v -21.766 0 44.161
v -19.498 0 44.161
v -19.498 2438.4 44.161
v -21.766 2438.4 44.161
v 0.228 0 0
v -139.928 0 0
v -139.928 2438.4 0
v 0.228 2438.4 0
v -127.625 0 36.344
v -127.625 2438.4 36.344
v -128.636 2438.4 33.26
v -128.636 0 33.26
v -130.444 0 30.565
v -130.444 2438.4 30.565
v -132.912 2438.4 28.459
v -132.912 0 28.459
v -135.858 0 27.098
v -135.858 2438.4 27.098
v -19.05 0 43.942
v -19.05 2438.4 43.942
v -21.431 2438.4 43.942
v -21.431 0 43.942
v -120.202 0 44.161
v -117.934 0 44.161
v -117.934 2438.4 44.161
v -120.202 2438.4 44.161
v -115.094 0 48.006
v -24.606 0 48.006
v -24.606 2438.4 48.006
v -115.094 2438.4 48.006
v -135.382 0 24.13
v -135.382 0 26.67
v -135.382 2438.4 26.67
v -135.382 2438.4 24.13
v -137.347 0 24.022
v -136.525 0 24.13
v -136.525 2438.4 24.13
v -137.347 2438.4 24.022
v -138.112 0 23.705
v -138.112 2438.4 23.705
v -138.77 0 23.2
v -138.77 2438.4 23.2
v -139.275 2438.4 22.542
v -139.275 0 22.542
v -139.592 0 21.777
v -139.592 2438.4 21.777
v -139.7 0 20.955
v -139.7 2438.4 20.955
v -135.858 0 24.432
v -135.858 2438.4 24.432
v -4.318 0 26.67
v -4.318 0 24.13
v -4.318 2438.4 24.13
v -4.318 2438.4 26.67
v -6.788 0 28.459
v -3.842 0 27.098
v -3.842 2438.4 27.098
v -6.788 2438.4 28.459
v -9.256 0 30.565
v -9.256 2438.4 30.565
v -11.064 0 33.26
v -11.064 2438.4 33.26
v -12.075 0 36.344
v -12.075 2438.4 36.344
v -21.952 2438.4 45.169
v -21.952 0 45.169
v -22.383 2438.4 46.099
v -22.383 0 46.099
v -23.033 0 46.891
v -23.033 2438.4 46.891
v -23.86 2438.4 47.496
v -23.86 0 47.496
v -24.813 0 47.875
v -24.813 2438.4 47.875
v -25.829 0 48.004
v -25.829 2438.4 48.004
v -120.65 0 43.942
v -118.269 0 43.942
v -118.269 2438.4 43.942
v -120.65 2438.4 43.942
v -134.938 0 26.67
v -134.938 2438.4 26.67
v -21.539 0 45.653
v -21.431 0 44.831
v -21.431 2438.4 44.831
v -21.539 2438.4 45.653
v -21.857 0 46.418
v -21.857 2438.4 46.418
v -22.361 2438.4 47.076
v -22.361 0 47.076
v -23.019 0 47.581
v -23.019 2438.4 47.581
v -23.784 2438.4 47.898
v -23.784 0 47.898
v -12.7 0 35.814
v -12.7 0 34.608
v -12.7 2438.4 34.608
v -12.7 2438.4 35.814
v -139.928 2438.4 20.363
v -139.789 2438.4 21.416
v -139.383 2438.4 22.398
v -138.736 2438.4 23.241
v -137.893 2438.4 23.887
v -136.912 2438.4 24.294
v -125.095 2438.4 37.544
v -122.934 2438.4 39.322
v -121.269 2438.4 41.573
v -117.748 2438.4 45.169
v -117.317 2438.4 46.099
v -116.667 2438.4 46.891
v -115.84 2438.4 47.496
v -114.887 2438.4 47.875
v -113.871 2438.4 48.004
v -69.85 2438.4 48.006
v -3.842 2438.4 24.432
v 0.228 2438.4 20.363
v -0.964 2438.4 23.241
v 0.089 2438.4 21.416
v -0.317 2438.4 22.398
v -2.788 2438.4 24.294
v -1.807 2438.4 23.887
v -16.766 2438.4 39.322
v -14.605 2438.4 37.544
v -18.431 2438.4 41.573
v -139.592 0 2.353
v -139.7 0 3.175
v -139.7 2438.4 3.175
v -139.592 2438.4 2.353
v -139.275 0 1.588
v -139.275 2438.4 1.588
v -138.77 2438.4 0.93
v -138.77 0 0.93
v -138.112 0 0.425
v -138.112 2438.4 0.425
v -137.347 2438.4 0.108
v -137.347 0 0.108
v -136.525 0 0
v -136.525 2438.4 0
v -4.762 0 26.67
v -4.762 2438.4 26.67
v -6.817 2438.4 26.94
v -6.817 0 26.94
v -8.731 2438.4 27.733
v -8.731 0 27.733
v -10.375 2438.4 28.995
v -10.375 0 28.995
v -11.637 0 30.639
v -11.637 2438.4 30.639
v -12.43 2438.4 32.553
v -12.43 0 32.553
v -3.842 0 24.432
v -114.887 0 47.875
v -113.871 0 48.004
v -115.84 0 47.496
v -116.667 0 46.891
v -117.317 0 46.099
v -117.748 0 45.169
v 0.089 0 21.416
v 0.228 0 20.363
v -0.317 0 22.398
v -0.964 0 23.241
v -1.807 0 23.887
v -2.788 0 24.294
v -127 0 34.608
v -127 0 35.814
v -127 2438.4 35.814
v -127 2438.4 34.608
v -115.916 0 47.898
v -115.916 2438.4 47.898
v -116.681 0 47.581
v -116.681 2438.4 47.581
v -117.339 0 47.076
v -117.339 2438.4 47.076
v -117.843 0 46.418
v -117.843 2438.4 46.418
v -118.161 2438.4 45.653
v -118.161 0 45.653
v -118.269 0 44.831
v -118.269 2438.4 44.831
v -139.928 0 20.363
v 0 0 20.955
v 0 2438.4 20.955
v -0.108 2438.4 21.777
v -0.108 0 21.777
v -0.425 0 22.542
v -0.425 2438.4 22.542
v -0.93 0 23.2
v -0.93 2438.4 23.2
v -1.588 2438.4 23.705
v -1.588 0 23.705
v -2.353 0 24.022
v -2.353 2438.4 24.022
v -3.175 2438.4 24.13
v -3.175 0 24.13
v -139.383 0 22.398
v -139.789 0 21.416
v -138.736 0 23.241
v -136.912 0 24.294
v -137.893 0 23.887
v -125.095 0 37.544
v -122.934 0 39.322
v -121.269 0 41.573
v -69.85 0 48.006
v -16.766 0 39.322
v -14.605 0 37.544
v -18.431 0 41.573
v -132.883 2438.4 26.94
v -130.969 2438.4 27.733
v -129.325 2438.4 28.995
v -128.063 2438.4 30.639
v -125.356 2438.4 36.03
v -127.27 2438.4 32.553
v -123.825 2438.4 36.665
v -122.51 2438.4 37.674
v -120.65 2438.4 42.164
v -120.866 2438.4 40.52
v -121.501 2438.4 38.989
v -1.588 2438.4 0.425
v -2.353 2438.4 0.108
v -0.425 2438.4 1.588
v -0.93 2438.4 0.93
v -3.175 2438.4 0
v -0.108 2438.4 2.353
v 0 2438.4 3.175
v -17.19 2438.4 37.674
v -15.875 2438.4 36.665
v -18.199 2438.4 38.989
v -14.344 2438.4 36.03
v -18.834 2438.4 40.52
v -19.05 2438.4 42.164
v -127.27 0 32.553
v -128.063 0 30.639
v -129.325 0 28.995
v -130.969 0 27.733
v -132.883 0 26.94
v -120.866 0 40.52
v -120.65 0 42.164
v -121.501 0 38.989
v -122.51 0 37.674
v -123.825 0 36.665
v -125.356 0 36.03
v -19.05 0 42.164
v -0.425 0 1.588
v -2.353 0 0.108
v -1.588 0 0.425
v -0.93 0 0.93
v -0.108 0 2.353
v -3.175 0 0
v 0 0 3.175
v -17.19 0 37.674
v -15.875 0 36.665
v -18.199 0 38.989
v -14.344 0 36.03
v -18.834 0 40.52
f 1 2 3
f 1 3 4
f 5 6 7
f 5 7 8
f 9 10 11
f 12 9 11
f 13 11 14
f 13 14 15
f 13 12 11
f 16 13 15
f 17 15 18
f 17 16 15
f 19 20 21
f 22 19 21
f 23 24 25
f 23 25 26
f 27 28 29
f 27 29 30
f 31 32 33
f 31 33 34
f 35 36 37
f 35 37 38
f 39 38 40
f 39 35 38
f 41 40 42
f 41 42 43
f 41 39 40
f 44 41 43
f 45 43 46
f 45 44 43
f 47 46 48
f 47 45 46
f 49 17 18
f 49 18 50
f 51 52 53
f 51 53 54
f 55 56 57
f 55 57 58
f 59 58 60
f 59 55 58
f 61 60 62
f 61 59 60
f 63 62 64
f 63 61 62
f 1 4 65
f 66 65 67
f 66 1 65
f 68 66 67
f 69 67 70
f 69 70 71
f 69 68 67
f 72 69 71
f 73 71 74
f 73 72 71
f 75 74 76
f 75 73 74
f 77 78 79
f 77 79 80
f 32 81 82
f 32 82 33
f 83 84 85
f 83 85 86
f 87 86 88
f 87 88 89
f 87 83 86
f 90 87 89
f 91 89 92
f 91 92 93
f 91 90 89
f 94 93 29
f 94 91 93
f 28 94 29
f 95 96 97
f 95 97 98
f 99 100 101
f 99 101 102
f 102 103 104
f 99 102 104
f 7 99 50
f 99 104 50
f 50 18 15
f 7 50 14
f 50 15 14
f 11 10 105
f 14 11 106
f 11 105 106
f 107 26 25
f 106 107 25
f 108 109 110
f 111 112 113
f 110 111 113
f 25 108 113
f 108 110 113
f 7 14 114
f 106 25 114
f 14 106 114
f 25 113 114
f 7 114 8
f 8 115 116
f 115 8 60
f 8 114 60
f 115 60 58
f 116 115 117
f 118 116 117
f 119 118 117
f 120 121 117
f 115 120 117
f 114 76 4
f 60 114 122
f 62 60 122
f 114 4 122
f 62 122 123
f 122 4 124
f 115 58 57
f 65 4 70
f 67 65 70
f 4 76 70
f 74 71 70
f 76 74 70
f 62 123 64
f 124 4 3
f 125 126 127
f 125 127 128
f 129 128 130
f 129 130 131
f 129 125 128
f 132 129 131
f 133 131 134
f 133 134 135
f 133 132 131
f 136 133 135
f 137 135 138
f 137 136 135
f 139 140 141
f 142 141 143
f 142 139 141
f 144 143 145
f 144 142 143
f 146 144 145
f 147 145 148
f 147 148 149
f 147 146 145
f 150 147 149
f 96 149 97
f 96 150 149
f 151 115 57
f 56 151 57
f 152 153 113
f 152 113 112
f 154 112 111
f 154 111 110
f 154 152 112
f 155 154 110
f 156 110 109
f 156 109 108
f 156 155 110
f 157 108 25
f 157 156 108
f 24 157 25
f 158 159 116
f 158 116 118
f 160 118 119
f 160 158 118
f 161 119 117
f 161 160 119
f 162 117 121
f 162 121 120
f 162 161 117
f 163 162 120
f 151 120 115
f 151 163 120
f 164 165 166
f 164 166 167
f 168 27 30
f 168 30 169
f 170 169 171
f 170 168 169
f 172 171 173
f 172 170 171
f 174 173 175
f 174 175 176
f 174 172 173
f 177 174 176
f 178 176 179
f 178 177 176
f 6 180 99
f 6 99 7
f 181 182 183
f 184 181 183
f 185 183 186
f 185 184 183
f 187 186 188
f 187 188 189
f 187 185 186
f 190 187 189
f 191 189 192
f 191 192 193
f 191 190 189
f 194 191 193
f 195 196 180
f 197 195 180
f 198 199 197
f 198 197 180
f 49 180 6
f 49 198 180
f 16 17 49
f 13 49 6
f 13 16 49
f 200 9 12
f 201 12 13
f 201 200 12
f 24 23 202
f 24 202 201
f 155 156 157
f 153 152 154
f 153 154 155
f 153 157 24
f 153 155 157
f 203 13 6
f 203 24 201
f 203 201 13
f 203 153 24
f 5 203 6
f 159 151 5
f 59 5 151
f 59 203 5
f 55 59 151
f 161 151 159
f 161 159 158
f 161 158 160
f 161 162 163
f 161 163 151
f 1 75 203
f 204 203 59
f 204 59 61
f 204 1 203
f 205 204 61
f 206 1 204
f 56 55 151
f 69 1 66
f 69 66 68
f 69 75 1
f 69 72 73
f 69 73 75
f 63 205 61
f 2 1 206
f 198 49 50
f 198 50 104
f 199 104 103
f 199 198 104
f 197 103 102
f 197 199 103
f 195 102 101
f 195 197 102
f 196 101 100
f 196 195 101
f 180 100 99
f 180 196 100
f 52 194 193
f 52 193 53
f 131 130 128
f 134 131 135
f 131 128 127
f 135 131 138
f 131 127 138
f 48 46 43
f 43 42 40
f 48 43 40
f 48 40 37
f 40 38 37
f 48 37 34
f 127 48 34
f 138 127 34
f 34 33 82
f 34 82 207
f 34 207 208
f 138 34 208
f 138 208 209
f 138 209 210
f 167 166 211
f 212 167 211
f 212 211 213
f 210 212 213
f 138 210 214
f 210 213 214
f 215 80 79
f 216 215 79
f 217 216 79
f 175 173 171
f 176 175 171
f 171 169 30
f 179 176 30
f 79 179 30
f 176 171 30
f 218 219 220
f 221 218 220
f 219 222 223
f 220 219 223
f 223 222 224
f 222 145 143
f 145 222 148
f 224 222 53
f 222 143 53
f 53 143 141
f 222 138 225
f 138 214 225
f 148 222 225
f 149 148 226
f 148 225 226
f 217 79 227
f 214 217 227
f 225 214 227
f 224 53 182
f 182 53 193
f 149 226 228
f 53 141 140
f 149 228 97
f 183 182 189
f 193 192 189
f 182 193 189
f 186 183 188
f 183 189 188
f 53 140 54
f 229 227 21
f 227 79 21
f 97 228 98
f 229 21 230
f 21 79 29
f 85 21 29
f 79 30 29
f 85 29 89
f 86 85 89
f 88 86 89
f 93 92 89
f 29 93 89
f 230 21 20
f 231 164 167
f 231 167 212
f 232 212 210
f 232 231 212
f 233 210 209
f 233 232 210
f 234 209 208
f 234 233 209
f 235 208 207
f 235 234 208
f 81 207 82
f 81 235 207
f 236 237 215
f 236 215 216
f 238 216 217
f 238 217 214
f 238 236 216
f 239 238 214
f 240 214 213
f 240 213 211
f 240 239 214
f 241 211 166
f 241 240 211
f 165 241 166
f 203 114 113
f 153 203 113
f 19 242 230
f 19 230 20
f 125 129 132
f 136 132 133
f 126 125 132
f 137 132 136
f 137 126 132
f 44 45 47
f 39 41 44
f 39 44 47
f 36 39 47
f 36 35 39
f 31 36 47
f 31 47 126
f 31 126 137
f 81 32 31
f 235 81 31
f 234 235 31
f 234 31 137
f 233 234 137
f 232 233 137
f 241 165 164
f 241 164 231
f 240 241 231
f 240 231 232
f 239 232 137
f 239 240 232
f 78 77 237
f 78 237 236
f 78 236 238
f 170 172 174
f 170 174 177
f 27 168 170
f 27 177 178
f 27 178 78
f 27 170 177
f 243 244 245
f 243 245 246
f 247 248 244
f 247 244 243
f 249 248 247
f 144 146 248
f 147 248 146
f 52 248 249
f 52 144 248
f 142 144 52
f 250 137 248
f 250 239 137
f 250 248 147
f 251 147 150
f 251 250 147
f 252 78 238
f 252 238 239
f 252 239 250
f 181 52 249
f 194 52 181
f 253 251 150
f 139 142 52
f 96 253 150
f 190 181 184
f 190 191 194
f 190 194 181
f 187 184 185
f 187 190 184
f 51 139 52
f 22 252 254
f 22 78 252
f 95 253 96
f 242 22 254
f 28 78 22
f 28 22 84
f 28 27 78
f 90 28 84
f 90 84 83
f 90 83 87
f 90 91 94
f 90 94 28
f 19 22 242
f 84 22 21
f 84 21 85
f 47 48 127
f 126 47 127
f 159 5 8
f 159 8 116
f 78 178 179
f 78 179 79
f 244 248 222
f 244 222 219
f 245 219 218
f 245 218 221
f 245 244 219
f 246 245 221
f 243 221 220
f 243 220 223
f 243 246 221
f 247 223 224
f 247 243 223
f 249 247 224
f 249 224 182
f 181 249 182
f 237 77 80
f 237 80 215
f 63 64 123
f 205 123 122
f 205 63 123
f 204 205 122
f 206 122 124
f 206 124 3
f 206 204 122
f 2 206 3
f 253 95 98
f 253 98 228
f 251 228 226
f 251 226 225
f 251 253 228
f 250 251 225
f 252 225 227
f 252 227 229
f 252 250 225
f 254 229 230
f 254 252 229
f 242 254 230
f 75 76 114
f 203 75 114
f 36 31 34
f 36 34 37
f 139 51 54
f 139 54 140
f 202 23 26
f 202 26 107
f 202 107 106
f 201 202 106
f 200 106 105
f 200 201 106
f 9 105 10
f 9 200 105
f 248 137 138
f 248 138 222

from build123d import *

# Parameters (mm, degrees)
F1_DEPTH = 2438.4
F3_DEPTH = 2438.4


with BuildPart() as f1:
    # F0 (on Front) → F1 (new body)
    with BuildSketch(Plane.XZ):
        with BuildLine():
            Line((-136.525, 0), (-3.175, 0))
            ThreePointArc((-3.175, 0), (-0.929936, 0.929936), (0, 3.175))
            Line((0, 3.175), (0, 20.955))
            ThreePointArc((0, 20.955), (-0.929936, 23.200064), (-3.175, 24.13))
            Line((-3.175, 24.13), (-4.318, 24.13))
            Line((-4.318, 24.13), (-4.318, 26.67))
            Line((-4.318, 26.67), (-4.7625, 26.67))
            ThreePointArc((-4.7625, 26.67), (-10.37516, 28.99484), (-12.7, 34.6075))
            Line((-12.7, 34.6075), (-12.7, 35.814))
            ThreePointArc((-12.7, 35.814), (-17.190128, 37.673872), (-19.05, 42.164))
            Line((-19.05, 42.164), (-19.05, 43.942))
            Line((-19.05, 43.942), (-21.43125, 43.942))
            Line((-21.43125, 43.942), (-21.43125, 44.831))
            ThreePointArc((-21.43125, 44.831), (-22.361186, 47.076064), (-24.60625, 48.006))
            Line((-24.60625, 48.006), (-115.09375, 48.006))
            ThreePointArc((-115.09375, 48.006), (-117.338814, 47.076064), (-118.26875, 44.831))
            Line((-118.26875, 44.831), (-118.26875, 43.942))
            Line((-118.26875, 43.942), (-120.65, 43.942))
            Line((-120.65, 43.942), (-120.65, 42.164))
            ThreePointArc((-120.65, 42.164), (-122.509872, 37.673872), (-127, 35.814))
            Line((-127, 35.814), (-127, 34.6075))
            ThreePointArc((-127, 34.6075), (-129.32484, 28.99484), (-134.9375, 26.67))
            Line((-134.9375, 26.67), (-135.382, 26.67))
            Line((-135.382, 26.67), (-135.382, 24.13))
            Line((-135.382, 24.13), (-136.525, 24.13))
            ThreePointArc((-136.525, 24.13), (-138.770064, 23.200064), (-139.7, 20.955))
            Line((-139.7, 20.955), (-139.7, 3.175))
            ThreePointArc((-139.7, 3.175), (-138.770064, 0.929936), (-136.525, 0))
        make_face()
    extrude(amount=-F1_DEPTH)


with BuildPart() as f3:
    # F2 (on Front) → F3 (new body, through all)
    with BuildSketch(Plane.XZ):
        with BuildLine():
            Line((-135.858312, 27.097526), (-135.858312, 24.432482))
            ThreePointArc((-135.858312, 24.432482), (-138.735896, 23.240548), (-139.92783, 20.362965))
            Line((-139.92783, 20.362965), (-139.92783, 0))
            Line((-139.92783, 0), (-69.85, 0))
            Line((-69.85, 0), (-69.85, 48.006))
            Line((-69.85, 48.006), (-113.870633, 48.003875))
            ThreePointArc((-113.870633, 48.003875), (-116.666991, 46.890935), (-117.933842, 44.160854))
            Line((-117.933842, 44.160854), (-120.201766, 44.160854))
            ThreePointArc((-120.201766, 44.160854), (-122.933718, 39.322206), (-127.624571, 36.343619))
            ThreePointArc((-127.624571, 36.343619), (-130.443802, 30.565011), (-135.858312, 27.097526))
        make_face()
        with BuildLine():
            Line((-69.85, 48.006), (-69.85, 0))
            Line((-69.85, 0), (0.22783, 0))
            Line((0.22783, 0), (0.22783, 20.362965))
            ThreePointArc((0.22783, 20.362965), (-0.964104, 23.240548), (-3.841688, 24.432482))
            Line((-3.841688, 24.432482), (-3.841688, 27.097526))
            ThreePointArc((-3.841688, 27.097526), (-9.256198, 30.565011), (-12.075429, 36.343619))
            ThreePointArc((-12.075429, 36.343619), (-16.766282, 39.322206), (-19.498234, 44.160854))
            Line((-19.498234, 44.160854), (-21.766158, 44.160854))
            ThreePointArc((-21.766158, 44.160854), (-23.033009, 46.890935), (-25.829367, 48.003875))
            Line((-25.829367, 48.003875), (-69.85, 48.006))
        make_face()
    extrude(amount=-F3_DEPTH)


solid = Compound([f1.part, f3.part])
